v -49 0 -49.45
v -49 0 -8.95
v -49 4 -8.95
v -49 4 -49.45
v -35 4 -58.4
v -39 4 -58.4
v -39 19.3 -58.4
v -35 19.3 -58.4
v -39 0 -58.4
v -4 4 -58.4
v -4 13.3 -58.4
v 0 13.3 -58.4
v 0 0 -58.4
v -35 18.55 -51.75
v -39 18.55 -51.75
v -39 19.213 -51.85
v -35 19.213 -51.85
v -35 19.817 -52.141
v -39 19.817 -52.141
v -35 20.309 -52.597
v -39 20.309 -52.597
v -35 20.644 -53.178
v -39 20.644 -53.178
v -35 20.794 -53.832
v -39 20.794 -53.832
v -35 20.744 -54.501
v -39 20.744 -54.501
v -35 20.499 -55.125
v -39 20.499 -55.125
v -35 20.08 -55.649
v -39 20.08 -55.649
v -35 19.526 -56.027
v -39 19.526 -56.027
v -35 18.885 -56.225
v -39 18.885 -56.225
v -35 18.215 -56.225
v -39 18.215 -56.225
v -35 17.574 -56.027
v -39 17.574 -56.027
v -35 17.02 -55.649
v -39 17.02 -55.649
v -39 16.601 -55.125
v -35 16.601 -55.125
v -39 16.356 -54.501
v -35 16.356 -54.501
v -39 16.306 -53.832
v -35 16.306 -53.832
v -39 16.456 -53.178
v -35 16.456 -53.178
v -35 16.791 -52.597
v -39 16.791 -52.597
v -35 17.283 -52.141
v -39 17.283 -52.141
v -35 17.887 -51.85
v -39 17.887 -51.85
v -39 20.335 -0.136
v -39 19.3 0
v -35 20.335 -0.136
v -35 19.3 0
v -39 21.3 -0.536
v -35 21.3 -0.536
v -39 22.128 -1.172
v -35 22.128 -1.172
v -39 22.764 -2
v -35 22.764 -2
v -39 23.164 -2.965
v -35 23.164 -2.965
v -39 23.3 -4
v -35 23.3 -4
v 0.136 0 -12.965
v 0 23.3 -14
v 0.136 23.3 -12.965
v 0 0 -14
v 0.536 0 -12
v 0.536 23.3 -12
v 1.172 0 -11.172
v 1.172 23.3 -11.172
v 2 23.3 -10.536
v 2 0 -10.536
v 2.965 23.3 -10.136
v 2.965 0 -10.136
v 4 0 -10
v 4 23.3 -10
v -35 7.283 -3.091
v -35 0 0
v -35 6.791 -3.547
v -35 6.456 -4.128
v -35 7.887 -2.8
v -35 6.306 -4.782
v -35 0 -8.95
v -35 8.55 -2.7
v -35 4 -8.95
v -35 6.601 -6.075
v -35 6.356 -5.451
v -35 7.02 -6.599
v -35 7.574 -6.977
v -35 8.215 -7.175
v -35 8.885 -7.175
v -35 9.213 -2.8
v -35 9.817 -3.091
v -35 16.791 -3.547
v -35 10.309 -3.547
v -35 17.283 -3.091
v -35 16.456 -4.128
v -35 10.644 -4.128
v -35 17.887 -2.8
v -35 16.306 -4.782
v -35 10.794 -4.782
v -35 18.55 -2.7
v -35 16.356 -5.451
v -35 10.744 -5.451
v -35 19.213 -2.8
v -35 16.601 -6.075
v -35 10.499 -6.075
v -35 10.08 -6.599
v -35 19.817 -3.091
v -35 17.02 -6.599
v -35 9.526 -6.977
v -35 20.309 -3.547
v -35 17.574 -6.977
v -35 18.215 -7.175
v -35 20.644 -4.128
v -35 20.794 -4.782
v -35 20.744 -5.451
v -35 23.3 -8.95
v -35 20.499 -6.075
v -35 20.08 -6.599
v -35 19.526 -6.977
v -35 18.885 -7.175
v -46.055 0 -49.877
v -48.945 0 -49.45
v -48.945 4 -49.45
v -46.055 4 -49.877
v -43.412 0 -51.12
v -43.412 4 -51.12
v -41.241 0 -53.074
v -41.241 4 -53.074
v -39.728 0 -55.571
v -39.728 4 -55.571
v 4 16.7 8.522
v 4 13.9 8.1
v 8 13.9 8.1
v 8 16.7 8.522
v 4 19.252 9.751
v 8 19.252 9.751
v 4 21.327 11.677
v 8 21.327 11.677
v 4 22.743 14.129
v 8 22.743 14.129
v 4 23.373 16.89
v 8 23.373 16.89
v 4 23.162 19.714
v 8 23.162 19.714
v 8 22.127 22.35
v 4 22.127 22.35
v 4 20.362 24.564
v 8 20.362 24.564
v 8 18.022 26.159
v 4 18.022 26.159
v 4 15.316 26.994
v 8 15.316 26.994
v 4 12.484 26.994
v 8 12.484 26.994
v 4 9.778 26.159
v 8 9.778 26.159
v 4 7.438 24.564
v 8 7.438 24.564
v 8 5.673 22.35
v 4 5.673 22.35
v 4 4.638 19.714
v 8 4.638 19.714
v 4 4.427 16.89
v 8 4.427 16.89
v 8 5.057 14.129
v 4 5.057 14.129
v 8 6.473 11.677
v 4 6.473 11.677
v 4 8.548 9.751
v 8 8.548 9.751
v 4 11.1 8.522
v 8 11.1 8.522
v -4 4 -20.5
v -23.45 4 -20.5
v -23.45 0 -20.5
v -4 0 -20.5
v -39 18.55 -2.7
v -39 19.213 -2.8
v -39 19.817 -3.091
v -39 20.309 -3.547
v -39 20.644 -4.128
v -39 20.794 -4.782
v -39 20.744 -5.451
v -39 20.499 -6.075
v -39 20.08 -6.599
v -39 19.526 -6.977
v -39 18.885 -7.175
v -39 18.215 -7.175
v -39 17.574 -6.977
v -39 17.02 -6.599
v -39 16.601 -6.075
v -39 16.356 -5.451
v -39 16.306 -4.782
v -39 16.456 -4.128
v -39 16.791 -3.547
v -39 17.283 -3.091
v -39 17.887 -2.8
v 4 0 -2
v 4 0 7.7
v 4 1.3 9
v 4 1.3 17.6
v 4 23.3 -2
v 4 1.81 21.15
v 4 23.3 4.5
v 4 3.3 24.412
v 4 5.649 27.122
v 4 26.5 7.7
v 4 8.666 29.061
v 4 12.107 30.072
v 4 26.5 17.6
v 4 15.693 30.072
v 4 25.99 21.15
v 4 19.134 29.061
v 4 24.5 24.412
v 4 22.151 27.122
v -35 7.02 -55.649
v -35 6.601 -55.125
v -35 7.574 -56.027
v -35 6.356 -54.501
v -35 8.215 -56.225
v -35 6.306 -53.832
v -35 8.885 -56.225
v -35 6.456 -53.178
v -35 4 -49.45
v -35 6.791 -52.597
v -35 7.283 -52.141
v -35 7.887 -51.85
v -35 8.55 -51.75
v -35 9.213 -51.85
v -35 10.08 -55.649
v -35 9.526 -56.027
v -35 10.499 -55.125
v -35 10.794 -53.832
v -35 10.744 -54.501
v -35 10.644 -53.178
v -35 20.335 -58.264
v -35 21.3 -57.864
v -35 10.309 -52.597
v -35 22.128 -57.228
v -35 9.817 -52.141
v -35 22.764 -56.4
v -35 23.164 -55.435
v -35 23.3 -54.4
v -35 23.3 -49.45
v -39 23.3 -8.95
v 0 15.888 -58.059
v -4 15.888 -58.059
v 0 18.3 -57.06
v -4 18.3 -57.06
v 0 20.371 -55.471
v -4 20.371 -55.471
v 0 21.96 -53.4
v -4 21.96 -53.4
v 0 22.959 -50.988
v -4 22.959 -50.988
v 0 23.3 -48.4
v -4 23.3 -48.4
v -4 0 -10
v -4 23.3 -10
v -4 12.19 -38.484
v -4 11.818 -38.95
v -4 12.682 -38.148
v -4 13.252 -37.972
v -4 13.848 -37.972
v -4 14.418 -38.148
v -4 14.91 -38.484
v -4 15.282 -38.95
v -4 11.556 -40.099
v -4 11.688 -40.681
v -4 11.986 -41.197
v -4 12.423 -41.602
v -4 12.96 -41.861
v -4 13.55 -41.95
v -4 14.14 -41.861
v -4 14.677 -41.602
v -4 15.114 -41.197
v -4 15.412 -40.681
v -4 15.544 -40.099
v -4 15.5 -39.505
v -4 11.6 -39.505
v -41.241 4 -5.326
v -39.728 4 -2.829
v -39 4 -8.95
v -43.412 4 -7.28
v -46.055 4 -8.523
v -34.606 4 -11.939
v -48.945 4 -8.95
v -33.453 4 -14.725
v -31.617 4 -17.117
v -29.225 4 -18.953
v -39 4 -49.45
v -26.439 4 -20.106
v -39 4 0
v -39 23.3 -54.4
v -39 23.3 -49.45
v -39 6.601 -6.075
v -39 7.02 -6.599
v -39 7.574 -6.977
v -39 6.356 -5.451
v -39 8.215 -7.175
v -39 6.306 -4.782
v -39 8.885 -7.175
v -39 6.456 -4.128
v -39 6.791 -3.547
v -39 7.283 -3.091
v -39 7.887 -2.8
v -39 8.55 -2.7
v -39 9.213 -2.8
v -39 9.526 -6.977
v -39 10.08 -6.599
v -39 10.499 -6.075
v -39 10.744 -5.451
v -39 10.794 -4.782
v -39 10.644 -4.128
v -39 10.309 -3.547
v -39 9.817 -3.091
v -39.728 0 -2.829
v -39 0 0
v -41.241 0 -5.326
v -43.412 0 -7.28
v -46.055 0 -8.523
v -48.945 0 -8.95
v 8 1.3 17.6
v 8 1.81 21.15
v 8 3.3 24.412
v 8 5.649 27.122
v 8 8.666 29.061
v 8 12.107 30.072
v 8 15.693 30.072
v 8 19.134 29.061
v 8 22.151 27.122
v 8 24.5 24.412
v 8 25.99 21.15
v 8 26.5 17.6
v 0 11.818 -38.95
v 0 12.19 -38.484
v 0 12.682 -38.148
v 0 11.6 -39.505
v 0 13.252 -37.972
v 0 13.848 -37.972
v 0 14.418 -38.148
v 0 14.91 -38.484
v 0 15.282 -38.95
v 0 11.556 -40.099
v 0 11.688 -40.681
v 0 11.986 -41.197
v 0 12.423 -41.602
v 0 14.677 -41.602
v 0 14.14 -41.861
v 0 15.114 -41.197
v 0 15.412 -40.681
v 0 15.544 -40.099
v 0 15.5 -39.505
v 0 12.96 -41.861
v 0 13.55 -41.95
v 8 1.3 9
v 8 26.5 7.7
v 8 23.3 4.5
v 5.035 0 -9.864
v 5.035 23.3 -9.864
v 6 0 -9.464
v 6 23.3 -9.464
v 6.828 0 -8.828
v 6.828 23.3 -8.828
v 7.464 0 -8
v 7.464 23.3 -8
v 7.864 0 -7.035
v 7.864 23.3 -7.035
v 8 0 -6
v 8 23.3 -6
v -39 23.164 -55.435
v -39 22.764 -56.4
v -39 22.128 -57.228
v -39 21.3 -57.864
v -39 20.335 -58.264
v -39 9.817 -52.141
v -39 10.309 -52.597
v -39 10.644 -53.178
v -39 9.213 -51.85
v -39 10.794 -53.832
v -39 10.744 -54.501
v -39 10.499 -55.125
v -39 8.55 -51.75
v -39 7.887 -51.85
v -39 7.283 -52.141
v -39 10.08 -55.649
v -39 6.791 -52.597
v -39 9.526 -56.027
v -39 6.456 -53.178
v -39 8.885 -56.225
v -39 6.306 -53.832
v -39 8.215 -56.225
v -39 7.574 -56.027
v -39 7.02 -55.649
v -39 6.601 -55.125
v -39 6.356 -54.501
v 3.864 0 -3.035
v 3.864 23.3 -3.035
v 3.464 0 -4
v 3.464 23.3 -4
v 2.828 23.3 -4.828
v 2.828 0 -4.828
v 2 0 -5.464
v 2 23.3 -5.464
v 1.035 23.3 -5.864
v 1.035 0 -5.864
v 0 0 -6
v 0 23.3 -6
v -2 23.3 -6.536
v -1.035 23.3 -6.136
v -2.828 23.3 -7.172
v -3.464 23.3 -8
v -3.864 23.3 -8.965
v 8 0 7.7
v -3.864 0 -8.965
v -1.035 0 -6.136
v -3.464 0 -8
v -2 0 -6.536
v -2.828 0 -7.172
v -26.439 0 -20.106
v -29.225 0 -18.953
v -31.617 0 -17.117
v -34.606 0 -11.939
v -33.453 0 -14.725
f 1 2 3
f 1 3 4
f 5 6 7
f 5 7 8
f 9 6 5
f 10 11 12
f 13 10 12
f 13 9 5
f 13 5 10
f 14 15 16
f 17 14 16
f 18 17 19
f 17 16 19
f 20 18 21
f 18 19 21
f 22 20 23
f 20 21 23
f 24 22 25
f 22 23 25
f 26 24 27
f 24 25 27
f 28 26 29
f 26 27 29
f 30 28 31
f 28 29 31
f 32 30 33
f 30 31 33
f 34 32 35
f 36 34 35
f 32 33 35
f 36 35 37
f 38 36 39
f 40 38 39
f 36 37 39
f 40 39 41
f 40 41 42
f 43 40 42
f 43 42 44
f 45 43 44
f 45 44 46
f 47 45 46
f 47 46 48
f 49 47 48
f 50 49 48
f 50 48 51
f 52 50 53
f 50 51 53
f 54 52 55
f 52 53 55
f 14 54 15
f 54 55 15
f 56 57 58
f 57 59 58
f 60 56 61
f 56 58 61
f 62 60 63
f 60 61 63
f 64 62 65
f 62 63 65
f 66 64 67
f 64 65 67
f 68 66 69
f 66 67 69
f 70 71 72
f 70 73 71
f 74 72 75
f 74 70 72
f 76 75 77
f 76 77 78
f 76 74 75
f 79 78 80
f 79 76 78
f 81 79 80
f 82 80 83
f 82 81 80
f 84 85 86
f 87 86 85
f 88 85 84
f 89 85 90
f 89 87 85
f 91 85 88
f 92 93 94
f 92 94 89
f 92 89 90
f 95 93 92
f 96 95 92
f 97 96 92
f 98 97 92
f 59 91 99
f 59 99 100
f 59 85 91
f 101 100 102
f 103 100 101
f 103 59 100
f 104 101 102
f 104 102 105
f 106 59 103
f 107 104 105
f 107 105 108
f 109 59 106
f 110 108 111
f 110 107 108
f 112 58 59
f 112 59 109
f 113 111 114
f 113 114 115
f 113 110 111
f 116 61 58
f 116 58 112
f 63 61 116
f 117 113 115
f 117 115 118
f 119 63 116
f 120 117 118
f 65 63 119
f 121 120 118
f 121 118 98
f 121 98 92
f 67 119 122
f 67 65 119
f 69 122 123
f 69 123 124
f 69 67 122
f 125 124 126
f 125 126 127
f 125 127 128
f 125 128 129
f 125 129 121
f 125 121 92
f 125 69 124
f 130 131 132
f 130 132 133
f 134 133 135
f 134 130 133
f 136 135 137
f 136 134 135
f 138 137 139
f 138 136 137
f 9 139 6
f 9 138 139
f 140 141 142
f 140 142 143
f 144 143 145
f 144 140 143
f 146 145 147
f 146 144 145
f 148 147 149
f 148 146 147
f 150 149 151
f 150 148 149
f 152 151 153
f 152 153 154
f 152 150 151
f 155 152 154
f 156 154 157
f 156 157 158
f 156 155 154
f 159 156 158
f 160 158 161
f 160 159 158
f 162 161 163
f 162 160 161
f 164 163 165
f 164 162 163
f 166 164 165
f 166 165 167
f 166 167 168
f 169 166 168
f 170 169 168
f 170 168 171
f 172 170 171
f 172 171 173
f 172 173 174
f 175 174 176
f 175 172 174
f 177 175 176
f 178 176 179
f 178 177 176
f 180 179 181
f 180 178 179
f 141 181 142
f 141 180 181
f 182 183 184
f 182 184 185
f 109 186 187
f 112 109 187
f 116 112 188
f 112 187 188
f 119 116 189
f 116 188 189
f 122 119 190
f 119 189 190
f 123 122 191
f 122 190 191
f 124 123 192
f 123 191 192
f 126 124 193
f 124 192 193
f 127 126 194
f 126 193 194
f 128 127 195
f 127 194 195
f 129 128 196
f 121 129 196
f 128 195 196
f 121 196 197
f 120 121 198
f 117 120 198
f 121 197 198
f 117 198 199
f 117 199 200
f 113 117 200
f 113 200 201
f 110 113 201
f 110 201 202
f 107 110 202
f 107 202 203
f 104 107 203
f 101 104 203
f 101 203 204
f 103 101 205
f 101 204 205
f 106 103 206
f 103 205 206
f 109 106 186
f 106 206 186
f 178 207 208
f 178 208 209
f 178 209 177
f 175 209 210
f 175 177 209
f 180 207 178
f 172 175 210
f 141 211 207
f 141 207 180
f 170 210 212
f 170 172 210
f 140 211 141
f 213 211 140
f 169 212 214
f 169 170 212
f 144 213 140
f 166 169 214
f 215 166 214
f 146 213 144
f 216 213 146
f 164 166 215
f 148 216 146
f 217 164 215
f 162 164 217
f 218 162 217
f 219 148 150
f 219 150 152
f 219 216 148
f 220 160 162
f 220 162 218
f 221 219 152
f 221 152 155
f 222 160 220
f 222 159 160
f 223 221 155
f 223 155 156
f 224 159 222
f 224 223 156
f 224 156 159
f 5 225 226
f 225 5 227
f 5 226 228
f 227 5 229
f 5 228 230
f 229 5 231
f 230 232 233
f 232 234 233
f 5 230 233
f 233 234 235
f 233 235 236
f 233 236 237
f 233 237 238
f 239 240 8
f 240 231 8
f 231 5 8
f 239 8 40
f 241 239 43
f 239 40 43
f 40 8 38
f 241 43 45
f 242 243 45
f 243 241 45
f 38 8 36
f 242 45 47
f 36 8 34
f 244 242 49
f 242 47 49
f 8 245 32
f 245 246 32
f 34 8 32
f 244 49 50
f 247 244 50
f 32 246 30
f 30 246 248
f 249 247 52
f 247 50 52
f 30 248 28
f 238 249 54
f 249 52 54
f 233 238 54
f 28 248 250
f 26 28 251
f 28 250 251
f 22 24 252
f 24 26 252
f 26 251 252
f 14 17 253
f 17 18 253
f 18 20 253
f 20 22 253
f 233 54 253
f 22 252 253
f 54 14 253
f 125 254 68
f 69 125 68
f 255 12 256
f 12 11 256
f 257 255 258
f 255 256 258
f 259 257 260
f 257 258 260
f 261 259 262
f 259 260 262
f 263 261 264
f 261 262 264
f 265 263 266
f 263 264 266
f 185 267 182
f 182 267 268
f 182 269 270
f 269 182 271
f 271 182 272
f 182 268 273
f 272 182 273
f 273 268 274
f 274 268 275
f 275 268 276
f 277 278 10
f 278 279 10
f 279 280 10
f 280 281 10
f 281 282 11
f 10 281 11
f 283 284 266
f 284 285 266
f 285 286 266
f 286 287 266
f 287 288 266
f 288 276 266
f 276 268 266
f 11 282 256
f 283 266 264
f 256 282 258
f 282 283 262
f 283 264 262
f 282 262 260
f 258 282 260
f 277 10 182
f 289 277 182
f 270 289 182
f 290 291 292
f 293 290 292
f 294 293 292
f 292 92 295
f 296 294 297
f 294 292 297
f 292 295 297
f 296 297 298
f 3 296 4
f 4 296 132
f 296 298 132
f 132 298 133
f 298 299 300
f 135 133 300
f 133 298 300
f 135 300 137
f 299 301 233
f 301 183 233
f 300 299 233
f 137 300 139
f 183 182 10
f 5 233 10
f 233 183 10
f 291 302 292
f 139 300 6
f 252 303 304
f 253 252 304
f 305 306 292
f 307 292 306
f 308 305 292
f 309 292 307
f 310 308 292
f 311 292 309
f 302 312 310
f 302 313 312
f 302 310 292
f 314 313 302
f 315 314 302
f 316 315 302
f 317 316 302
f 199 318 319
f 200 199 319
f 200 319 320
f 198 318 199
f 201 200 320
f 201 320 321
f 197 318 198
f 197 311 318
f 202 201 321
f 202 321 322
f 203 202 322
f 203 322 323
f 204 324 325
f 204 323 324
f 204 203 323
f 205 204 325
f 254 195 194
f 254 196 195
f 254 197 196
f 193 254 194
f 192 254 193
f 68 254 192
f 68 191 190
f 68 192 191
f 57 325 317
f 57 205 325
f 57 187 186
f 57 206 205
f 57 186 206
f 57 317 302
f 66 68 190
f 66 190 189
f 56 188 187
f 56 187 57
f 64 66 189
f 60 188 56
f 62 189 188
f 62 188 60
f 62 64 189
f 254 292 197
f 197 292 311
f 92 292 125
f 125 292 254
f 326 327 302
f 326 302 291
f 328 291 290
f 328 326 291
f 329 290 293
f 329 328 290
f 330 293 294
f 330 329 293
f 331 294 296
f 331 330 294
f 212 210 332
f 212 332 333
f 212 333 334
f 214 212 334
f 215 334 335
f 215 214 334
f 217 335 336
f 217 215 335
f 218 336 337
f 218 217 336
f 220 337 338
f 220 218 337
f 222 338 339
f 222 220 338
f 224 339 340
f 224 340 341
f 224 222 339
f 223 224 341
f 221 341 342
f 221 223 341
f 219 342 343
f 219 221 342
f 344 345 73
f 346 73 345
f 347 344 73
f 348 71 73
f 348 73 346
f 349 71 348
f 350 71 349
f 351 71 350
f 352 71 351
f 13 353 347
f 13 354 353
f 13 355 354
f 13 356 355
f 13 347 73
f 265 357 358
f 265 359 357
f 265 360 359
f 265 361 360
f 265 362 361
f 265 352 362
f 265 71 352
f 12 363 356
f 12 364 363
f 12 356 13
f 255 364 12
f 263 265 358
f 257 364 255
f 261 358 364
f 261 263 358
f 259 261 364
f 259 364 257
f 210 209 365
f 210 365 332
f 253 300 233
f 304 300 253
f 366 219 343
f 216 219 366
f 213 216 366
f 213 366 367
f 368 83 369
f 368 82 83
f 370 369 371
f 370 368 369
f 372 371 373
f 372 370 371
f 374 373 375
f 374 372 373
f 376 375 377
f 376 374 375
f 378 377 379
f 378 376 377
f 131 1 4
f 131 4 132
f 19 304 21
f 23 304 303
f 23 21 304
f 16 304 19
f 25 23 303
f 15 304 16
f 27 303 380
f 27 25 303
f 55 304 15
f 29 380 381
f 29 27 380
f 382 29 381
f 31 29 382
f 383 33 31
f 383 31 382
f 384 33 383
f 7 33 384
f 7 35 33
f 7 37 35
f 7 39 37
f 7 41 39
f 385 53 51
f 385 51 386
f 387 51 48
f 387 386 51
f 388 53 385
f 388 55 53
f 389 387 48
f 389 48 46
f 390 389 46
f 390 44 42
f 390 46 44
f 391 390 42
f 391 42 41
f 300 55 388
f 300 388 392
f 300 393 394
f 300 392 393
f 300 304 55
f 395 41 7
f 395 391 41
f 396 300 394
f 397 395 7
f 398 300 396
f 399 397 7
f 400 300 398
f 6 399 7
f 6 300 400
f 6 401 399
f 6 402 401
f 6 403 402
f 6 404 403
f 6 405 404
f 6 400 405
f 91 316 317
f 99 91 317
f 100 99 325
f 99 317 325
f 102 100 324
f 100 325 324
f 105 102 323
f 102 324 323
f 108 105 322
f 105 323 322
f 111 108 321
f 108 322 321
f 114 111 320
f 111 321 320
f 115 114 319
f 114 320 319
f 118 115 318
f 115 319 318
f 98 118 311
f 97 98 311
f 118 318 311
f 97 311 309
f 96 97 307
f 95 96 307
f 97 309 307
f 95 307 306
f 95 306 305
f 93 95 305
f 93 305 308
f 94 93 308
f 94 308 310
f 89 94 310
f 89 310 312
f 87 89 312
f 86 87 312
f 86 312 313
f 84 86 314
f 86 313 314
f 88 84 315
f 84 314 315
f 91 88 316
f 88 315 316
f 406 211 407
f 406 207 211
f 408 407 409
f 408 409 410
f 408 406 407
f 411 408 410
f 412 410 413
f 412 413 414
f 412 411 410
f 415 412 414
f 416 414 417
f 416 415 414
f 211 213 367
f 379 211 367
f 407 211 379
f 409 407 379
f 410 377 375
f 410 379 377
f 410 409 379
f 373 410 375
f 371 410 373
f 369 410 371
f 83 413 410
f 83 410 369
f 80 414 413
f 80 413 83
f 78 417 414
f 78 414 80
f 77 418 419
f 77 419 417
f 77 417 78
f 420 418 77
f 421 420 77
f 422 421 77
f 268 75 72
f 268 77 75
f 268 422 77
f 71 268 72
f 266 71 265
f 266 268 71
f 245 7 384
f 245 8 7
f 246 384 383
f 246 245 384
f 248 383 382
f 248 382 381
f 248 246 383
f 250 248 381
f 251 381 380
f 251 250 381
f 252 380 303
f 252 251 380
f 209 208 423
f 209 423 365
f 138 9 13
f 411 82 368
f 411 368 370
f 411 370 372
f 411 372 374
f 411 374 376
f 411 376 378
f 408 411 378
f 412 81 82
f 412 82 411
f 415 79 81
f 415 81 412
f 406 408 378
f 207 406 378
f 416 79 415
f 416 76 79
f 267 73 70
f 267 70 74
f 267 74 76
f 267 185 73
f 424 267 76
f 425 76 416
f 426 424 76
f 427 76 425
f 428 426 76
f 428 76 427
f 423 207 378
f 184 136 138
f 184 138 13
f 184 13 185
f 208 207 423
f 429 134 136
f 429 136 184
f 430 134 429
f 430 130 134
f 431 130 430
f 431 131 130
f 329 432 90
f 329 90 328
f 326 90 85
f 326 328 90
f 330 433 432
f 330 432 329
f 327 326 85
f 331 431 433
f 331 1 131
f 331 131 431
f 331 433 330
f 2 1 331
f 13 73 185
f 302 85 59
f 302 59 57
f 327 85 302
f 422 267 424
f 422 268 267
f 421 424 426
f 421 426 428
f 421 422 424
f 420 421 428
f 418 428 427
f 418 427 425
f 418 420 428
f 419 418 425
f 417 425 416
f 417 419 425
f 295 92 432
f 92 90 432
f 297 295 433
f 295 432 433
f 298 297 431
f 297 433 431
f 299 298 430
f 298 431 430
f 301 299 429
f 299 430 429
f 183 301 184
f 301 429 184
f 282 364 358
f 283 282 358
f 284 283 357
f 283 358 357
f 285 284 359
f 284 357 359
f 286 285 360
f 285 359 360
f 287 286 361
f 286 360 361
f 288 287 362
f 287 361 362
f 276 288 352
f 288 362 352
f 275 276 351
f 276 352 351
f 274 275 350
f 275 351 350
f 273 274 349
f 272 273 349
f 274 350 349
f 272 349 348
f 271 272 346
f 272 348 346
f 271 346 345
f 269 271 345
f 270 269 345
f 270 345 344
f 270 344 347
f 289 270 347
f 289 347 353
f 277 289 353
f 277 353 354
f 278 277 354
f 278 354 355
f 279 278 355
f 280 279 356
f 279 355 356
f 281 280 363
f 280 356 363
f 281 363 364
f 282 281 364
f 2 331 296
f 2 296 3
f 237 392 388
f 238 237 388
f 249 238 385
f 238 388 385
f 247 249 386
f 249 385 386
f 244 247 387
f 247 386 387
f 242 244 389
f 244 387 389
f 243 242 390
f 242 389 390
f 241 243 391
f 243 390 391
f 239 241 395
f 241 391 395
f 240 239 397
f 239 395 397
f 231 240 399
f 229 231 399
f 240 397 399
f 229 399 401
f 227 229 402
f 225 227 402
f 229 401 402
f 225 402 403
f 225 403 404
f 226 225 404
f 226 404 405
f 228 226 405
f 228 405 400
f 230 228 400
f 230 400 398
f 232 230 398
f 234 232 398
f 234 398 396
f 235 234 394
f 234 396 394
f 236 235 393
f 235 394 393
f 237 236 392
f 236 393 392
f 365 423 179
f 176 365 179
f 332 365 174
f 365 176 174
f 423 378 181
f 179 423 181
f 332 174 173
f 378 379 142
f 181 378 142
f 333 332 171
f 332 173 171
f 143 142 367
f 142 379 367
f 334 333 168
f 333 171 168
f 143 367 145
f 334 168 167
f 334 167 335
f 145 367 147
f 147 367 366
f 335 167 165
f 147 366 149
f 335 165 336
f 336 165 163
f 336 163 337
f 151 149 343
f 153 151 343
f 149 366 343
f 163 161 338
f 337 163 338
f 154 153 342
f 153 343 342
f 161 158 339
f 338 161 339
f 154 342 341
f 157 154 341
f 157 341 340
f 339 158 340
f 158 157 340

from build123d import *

# Parameters (mm, degrees)
BOSS_EXTRUDE1_DEPTH = 4
SKETCH2_W           = 8.95
SKETCH2_H           = 19.3
SKETCH2_R           = 2.25
BOSS_EXTRUDE2_DEPTH = 4
FILLET1_R           = 10
FILLET2_R           = 4
SKETCH3_W           = 52.4
SKETCH3_H           = 19.3
SKETCH3_R           = 2
BOSS_EXTRUDE3_DEPTH = 4
FILLET3_R           = 10
SKETCH4_W           = 31
SKETCH4_H           = 20.5
CUT_EXTRUDE1_DEPTH  = 10
SKETCH5_W           = 4
SKETCH5_H           = 6
CUT_EXTRUDE2_DEPTH  = 10
FILLET4_R           = 11.55
SKETCH6_W           = 4
SKETCH6_H           = 4
BOSS_EXTRUDE4_DEPTH = 23.3
SKETCH7_R           = 9.5
BOSS_EXTRUDE5_DEPTH = 4
FILLET5_R           = 4


# Some blends are built 0.0001 mm under size
with BuildPart() as part:
    # Sketch1 → Boss-Extrude1 (new body)
    with BuildSketch(Plane(origin=(0, 0, 0), x_dir=(1, 0, 0), z_dir=(0, 1, 0))):
        Polygon((-49, 49.45), (-39, 49.45), (-39, 58.4), (0, 58.4), (0, 0), (-39, 0), (-39, 8.95), (-49, 8.95), align=None)
    extrude(amount=BOSS_EXTRUDE1_DEPTH)

    # Sketch2 → Boss-Extrude2 (add)
    # profile 1 of 2: a face of its own
    with BuildSketch(Plane.ZY.offset(39)):
        with Locations((-4.475, 13.65)):
            Rectangle(SKETCH2_W, SKETCH2_H)
        with Locations((-4.95, 18.55)):
            Circle(SKETCH2_R, mode=Mode.SUBTRACT)
        with Locations((-4.95, 8.55)):
            Circle(SKETCH2_R, mode=Mode.SUBTRACT)
    # profile 2 of 2: a face of its own
    with BuildSketch(Plane.ZY.offset(39)):
        with Locations((-53.925, 13.65)):
            Rectangle(SKETCH2_W, SKETCH2_H)
        with Locations((-54, 18.55)):
            Circle(SKETCH2_R, mode=Mode.SUBTRACT)
        with Locations((-54, 8.55)):
            Circle(SKETCH2_R, mode=Mode.SUBTRACT)
    extrude(amount=-BOSS_EXTRUDE2_DEPTH)

    # Fillet1
    # the kernel refuses this fillet: 10 mm, written as the material it adds along each edge
    with BuildSketch(Plane(origin=(-39, 0, -49.45), x_dir=(-1, 0, 0), z_dir=(0, 1, 0))) as fillet1_piece_1:
        with BuildLine():
            CenterArc((9.944722218, -10), FILLET1_R, 90, 83.97283344)
            Line((0, -8.95), (0, 0))
            Line((0, 0), (9.944722218, 0))
        make_face()
    extrude(amount=4)
    with BuildSketch(Plane(origin=(-39, 0, -8.95), x_dir=(0, 0, 1), z_dir=(0, 1, 0))) as fillet1_piece_2:
        with BuildLine():
            CenterArc((10, -9.944722218), FILLET1_R, 96.02716656, 83.97283344)
            Line((0, -9.944722218), (0, 0))
            Line((0, 0), (8.95, 0))
        make_face()
    extrude(amount=4)

    # Fillet2
    fillet2_edges = [part.edges().sort_by_distance(p)[0] for p in [
        (-37, 23.3, 0),
        (-37, 23.3, -58.4),
    ]]
    fillet(fillet2_edges, radius=FILLET2_R)

    # Sketch3 → Boss-Extrude3 (add)
    with BuildSketch(Plane(origin=(0, 0, 0), x_dir=(0, 0, -1), z_dir=(1, 0, 0))):
        with Locations((32.2, 13.65)):
            Rectangle(SKETCH3_W, SKETCH3_H)
        with Locations((39.95, 13.55)):
            Circle(SKETCH3_R, mode=Mode.SUBTRACT)
    extrude(amount=-BOSS_EXTRUDE3_DEPTH)

    # Fillet3
    fillet3_edges = [part.edges().sort_by_distance(p)[0] for p in [
        (-2, 23.3, -58.4),
    ]]
    fillet(fillet3_edges, radius=FILLET3_R)

    # Sketch4 → Cut-Extrude1 (cut)
    with BuildSketch(Plane(origin=(0, 4, 0), x_dir=(1, 0, 0), z_dir=(0, 1, 0))):
        with Locations((-19.5, 10.25)):
            Rectangle(SKETCH4_W, SKETCH4_H)
    extrude(amount=-CUT_EXTRUDE1_DEPTH, mode=Mode.SUBTRACT)

    # Sketch5 → Cut-Extrude2 (cut)
    with BuildSketch(Plane(origin=(0, 4, 0), x_dir=(1, 0, 0), z_dir=(0, 1, 0))):
        with Locations((-2, 3)):
            Rectangle(SKETCH5_W, SKETCH5_H)
    extrude(amount=-CUT_EXTRUDE2_DEPTH, mode=Mode.SUBTRACT)

    # Fillet4
    fillet4_edges = [part.edges().sort_by_distance(p)[0] for p in [
        (-35, 2, -20.5),
    ]]
    fillet(fillet4_edges, radius=FILLET4_R)

    # Sketch6 → Boss-Extrude4 (add)
    with BuildSketch(Plane(origin=(0, 23.3, 0), x_dir=(1, 0, 0), z_dir=(0, 1, 0))):
        with Locations((2, 8)):
            Rectangle(SKETCH6_W, SKETCH6_H)
    extrude(amount=-BOSS_EXTRUDE4_DEPTH)

    # Sketch7 → Boss-Extrude5 (add)
    with BuildSketch(Plane(origin=(4, 0, 0), x_dir=(0, 0, -1), z_dir=(1, 0, 0))):
        with BuildLine():
            Line((-4.5, 23.3), (10, 23.3))
            Line((10, 23.3), (10, 0))
            Line((10, 0), (-7.7, 0))
            Line((-7.7, 0), (-9, 1.3))
            Line((-9, 1.3), (-17.6, 1.3))
            ThreePointArc((-17.6, 1.3), (-30.2, 13.9), (-17.6, 26.5))
            Line((-17.6, 26.5), (-7.7, 26.5))
            Line((-7.7, 26.5), (-4.5, 23.3))
        make_face()
        with Locations((-17.6, 13.9)):
            Circle(SKETCH7_R, mode=Mode.SUBTRACT)
    extrude(amount=BOSS_EXTRUDE5_DEPTH)

    # Fillet5
    fillet5_edges = [part.edges().sort_by_distance(p)[0] for p in [
        (4, 11.65, -6),
        (0, 11.65, -10),
    ]]
    fillet(fillet5_edges, radius=FILLET5_R)
    fillet5_2_edges = [part.edges().sort_by_distance(p)[0] for p in [
        (-4, 11.65, -6),
        (8, 11.65, -10),
    ]]
    fillet(fillet5_2_edges, radius=FILLET5_R - 0.0001)  # a hair under: the kernel refuses the full size


solid = part.part
